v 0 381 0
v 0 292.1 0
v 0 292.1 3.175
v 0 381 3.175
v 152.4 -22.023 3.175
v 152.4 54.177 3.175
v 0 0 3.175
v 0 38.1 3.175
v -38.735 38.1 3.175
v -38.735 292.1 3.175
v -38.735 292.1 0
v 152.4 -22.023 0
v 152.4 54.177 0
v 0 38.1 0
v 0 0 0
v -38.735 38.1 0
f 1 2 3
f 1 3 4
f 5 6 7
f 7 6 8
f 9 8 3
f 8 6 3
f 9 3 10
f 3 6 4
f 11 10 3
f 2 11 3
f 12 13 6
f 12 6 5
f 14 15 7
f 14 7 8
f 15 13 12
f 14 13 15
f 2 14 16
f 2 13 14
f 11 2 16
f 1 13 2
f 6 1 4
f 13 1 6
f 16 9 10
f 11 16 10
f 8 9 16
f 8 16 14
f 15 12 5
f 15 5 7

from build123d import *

# Parameters (mm, degrees)
BOSS_EXTRUDE1_DEPTH = 3.175
SKETCH2_W           = 38.735
SKETCH2_H           = 254
BOSS_EXTRUDE2_DEPTH = 3.175


with BuildPart() as part:
    # Sketch1 → Boss-Extrude1 (new body)
    with BuildSketch(Plane.XY):
        Polygon((0, 0), (0, 381), (152.4, 54.177145314), (152.4, -22.022854686), align=None)
    extrude(amount=BOSS_EXTRUDE1_DEPTH)

    # Sketch2 → Boss-Extrude2 (add)
    with BuildSketch(Plane.XY.offset(3.175)):
        with Locations((-19.3675, 165.1)):
            Rectangle(SKETCH2_W, SKETCH2_H)
    extrude(amount=-BOSS_EXTRUDE2_DEPTH)


solid = part.part
